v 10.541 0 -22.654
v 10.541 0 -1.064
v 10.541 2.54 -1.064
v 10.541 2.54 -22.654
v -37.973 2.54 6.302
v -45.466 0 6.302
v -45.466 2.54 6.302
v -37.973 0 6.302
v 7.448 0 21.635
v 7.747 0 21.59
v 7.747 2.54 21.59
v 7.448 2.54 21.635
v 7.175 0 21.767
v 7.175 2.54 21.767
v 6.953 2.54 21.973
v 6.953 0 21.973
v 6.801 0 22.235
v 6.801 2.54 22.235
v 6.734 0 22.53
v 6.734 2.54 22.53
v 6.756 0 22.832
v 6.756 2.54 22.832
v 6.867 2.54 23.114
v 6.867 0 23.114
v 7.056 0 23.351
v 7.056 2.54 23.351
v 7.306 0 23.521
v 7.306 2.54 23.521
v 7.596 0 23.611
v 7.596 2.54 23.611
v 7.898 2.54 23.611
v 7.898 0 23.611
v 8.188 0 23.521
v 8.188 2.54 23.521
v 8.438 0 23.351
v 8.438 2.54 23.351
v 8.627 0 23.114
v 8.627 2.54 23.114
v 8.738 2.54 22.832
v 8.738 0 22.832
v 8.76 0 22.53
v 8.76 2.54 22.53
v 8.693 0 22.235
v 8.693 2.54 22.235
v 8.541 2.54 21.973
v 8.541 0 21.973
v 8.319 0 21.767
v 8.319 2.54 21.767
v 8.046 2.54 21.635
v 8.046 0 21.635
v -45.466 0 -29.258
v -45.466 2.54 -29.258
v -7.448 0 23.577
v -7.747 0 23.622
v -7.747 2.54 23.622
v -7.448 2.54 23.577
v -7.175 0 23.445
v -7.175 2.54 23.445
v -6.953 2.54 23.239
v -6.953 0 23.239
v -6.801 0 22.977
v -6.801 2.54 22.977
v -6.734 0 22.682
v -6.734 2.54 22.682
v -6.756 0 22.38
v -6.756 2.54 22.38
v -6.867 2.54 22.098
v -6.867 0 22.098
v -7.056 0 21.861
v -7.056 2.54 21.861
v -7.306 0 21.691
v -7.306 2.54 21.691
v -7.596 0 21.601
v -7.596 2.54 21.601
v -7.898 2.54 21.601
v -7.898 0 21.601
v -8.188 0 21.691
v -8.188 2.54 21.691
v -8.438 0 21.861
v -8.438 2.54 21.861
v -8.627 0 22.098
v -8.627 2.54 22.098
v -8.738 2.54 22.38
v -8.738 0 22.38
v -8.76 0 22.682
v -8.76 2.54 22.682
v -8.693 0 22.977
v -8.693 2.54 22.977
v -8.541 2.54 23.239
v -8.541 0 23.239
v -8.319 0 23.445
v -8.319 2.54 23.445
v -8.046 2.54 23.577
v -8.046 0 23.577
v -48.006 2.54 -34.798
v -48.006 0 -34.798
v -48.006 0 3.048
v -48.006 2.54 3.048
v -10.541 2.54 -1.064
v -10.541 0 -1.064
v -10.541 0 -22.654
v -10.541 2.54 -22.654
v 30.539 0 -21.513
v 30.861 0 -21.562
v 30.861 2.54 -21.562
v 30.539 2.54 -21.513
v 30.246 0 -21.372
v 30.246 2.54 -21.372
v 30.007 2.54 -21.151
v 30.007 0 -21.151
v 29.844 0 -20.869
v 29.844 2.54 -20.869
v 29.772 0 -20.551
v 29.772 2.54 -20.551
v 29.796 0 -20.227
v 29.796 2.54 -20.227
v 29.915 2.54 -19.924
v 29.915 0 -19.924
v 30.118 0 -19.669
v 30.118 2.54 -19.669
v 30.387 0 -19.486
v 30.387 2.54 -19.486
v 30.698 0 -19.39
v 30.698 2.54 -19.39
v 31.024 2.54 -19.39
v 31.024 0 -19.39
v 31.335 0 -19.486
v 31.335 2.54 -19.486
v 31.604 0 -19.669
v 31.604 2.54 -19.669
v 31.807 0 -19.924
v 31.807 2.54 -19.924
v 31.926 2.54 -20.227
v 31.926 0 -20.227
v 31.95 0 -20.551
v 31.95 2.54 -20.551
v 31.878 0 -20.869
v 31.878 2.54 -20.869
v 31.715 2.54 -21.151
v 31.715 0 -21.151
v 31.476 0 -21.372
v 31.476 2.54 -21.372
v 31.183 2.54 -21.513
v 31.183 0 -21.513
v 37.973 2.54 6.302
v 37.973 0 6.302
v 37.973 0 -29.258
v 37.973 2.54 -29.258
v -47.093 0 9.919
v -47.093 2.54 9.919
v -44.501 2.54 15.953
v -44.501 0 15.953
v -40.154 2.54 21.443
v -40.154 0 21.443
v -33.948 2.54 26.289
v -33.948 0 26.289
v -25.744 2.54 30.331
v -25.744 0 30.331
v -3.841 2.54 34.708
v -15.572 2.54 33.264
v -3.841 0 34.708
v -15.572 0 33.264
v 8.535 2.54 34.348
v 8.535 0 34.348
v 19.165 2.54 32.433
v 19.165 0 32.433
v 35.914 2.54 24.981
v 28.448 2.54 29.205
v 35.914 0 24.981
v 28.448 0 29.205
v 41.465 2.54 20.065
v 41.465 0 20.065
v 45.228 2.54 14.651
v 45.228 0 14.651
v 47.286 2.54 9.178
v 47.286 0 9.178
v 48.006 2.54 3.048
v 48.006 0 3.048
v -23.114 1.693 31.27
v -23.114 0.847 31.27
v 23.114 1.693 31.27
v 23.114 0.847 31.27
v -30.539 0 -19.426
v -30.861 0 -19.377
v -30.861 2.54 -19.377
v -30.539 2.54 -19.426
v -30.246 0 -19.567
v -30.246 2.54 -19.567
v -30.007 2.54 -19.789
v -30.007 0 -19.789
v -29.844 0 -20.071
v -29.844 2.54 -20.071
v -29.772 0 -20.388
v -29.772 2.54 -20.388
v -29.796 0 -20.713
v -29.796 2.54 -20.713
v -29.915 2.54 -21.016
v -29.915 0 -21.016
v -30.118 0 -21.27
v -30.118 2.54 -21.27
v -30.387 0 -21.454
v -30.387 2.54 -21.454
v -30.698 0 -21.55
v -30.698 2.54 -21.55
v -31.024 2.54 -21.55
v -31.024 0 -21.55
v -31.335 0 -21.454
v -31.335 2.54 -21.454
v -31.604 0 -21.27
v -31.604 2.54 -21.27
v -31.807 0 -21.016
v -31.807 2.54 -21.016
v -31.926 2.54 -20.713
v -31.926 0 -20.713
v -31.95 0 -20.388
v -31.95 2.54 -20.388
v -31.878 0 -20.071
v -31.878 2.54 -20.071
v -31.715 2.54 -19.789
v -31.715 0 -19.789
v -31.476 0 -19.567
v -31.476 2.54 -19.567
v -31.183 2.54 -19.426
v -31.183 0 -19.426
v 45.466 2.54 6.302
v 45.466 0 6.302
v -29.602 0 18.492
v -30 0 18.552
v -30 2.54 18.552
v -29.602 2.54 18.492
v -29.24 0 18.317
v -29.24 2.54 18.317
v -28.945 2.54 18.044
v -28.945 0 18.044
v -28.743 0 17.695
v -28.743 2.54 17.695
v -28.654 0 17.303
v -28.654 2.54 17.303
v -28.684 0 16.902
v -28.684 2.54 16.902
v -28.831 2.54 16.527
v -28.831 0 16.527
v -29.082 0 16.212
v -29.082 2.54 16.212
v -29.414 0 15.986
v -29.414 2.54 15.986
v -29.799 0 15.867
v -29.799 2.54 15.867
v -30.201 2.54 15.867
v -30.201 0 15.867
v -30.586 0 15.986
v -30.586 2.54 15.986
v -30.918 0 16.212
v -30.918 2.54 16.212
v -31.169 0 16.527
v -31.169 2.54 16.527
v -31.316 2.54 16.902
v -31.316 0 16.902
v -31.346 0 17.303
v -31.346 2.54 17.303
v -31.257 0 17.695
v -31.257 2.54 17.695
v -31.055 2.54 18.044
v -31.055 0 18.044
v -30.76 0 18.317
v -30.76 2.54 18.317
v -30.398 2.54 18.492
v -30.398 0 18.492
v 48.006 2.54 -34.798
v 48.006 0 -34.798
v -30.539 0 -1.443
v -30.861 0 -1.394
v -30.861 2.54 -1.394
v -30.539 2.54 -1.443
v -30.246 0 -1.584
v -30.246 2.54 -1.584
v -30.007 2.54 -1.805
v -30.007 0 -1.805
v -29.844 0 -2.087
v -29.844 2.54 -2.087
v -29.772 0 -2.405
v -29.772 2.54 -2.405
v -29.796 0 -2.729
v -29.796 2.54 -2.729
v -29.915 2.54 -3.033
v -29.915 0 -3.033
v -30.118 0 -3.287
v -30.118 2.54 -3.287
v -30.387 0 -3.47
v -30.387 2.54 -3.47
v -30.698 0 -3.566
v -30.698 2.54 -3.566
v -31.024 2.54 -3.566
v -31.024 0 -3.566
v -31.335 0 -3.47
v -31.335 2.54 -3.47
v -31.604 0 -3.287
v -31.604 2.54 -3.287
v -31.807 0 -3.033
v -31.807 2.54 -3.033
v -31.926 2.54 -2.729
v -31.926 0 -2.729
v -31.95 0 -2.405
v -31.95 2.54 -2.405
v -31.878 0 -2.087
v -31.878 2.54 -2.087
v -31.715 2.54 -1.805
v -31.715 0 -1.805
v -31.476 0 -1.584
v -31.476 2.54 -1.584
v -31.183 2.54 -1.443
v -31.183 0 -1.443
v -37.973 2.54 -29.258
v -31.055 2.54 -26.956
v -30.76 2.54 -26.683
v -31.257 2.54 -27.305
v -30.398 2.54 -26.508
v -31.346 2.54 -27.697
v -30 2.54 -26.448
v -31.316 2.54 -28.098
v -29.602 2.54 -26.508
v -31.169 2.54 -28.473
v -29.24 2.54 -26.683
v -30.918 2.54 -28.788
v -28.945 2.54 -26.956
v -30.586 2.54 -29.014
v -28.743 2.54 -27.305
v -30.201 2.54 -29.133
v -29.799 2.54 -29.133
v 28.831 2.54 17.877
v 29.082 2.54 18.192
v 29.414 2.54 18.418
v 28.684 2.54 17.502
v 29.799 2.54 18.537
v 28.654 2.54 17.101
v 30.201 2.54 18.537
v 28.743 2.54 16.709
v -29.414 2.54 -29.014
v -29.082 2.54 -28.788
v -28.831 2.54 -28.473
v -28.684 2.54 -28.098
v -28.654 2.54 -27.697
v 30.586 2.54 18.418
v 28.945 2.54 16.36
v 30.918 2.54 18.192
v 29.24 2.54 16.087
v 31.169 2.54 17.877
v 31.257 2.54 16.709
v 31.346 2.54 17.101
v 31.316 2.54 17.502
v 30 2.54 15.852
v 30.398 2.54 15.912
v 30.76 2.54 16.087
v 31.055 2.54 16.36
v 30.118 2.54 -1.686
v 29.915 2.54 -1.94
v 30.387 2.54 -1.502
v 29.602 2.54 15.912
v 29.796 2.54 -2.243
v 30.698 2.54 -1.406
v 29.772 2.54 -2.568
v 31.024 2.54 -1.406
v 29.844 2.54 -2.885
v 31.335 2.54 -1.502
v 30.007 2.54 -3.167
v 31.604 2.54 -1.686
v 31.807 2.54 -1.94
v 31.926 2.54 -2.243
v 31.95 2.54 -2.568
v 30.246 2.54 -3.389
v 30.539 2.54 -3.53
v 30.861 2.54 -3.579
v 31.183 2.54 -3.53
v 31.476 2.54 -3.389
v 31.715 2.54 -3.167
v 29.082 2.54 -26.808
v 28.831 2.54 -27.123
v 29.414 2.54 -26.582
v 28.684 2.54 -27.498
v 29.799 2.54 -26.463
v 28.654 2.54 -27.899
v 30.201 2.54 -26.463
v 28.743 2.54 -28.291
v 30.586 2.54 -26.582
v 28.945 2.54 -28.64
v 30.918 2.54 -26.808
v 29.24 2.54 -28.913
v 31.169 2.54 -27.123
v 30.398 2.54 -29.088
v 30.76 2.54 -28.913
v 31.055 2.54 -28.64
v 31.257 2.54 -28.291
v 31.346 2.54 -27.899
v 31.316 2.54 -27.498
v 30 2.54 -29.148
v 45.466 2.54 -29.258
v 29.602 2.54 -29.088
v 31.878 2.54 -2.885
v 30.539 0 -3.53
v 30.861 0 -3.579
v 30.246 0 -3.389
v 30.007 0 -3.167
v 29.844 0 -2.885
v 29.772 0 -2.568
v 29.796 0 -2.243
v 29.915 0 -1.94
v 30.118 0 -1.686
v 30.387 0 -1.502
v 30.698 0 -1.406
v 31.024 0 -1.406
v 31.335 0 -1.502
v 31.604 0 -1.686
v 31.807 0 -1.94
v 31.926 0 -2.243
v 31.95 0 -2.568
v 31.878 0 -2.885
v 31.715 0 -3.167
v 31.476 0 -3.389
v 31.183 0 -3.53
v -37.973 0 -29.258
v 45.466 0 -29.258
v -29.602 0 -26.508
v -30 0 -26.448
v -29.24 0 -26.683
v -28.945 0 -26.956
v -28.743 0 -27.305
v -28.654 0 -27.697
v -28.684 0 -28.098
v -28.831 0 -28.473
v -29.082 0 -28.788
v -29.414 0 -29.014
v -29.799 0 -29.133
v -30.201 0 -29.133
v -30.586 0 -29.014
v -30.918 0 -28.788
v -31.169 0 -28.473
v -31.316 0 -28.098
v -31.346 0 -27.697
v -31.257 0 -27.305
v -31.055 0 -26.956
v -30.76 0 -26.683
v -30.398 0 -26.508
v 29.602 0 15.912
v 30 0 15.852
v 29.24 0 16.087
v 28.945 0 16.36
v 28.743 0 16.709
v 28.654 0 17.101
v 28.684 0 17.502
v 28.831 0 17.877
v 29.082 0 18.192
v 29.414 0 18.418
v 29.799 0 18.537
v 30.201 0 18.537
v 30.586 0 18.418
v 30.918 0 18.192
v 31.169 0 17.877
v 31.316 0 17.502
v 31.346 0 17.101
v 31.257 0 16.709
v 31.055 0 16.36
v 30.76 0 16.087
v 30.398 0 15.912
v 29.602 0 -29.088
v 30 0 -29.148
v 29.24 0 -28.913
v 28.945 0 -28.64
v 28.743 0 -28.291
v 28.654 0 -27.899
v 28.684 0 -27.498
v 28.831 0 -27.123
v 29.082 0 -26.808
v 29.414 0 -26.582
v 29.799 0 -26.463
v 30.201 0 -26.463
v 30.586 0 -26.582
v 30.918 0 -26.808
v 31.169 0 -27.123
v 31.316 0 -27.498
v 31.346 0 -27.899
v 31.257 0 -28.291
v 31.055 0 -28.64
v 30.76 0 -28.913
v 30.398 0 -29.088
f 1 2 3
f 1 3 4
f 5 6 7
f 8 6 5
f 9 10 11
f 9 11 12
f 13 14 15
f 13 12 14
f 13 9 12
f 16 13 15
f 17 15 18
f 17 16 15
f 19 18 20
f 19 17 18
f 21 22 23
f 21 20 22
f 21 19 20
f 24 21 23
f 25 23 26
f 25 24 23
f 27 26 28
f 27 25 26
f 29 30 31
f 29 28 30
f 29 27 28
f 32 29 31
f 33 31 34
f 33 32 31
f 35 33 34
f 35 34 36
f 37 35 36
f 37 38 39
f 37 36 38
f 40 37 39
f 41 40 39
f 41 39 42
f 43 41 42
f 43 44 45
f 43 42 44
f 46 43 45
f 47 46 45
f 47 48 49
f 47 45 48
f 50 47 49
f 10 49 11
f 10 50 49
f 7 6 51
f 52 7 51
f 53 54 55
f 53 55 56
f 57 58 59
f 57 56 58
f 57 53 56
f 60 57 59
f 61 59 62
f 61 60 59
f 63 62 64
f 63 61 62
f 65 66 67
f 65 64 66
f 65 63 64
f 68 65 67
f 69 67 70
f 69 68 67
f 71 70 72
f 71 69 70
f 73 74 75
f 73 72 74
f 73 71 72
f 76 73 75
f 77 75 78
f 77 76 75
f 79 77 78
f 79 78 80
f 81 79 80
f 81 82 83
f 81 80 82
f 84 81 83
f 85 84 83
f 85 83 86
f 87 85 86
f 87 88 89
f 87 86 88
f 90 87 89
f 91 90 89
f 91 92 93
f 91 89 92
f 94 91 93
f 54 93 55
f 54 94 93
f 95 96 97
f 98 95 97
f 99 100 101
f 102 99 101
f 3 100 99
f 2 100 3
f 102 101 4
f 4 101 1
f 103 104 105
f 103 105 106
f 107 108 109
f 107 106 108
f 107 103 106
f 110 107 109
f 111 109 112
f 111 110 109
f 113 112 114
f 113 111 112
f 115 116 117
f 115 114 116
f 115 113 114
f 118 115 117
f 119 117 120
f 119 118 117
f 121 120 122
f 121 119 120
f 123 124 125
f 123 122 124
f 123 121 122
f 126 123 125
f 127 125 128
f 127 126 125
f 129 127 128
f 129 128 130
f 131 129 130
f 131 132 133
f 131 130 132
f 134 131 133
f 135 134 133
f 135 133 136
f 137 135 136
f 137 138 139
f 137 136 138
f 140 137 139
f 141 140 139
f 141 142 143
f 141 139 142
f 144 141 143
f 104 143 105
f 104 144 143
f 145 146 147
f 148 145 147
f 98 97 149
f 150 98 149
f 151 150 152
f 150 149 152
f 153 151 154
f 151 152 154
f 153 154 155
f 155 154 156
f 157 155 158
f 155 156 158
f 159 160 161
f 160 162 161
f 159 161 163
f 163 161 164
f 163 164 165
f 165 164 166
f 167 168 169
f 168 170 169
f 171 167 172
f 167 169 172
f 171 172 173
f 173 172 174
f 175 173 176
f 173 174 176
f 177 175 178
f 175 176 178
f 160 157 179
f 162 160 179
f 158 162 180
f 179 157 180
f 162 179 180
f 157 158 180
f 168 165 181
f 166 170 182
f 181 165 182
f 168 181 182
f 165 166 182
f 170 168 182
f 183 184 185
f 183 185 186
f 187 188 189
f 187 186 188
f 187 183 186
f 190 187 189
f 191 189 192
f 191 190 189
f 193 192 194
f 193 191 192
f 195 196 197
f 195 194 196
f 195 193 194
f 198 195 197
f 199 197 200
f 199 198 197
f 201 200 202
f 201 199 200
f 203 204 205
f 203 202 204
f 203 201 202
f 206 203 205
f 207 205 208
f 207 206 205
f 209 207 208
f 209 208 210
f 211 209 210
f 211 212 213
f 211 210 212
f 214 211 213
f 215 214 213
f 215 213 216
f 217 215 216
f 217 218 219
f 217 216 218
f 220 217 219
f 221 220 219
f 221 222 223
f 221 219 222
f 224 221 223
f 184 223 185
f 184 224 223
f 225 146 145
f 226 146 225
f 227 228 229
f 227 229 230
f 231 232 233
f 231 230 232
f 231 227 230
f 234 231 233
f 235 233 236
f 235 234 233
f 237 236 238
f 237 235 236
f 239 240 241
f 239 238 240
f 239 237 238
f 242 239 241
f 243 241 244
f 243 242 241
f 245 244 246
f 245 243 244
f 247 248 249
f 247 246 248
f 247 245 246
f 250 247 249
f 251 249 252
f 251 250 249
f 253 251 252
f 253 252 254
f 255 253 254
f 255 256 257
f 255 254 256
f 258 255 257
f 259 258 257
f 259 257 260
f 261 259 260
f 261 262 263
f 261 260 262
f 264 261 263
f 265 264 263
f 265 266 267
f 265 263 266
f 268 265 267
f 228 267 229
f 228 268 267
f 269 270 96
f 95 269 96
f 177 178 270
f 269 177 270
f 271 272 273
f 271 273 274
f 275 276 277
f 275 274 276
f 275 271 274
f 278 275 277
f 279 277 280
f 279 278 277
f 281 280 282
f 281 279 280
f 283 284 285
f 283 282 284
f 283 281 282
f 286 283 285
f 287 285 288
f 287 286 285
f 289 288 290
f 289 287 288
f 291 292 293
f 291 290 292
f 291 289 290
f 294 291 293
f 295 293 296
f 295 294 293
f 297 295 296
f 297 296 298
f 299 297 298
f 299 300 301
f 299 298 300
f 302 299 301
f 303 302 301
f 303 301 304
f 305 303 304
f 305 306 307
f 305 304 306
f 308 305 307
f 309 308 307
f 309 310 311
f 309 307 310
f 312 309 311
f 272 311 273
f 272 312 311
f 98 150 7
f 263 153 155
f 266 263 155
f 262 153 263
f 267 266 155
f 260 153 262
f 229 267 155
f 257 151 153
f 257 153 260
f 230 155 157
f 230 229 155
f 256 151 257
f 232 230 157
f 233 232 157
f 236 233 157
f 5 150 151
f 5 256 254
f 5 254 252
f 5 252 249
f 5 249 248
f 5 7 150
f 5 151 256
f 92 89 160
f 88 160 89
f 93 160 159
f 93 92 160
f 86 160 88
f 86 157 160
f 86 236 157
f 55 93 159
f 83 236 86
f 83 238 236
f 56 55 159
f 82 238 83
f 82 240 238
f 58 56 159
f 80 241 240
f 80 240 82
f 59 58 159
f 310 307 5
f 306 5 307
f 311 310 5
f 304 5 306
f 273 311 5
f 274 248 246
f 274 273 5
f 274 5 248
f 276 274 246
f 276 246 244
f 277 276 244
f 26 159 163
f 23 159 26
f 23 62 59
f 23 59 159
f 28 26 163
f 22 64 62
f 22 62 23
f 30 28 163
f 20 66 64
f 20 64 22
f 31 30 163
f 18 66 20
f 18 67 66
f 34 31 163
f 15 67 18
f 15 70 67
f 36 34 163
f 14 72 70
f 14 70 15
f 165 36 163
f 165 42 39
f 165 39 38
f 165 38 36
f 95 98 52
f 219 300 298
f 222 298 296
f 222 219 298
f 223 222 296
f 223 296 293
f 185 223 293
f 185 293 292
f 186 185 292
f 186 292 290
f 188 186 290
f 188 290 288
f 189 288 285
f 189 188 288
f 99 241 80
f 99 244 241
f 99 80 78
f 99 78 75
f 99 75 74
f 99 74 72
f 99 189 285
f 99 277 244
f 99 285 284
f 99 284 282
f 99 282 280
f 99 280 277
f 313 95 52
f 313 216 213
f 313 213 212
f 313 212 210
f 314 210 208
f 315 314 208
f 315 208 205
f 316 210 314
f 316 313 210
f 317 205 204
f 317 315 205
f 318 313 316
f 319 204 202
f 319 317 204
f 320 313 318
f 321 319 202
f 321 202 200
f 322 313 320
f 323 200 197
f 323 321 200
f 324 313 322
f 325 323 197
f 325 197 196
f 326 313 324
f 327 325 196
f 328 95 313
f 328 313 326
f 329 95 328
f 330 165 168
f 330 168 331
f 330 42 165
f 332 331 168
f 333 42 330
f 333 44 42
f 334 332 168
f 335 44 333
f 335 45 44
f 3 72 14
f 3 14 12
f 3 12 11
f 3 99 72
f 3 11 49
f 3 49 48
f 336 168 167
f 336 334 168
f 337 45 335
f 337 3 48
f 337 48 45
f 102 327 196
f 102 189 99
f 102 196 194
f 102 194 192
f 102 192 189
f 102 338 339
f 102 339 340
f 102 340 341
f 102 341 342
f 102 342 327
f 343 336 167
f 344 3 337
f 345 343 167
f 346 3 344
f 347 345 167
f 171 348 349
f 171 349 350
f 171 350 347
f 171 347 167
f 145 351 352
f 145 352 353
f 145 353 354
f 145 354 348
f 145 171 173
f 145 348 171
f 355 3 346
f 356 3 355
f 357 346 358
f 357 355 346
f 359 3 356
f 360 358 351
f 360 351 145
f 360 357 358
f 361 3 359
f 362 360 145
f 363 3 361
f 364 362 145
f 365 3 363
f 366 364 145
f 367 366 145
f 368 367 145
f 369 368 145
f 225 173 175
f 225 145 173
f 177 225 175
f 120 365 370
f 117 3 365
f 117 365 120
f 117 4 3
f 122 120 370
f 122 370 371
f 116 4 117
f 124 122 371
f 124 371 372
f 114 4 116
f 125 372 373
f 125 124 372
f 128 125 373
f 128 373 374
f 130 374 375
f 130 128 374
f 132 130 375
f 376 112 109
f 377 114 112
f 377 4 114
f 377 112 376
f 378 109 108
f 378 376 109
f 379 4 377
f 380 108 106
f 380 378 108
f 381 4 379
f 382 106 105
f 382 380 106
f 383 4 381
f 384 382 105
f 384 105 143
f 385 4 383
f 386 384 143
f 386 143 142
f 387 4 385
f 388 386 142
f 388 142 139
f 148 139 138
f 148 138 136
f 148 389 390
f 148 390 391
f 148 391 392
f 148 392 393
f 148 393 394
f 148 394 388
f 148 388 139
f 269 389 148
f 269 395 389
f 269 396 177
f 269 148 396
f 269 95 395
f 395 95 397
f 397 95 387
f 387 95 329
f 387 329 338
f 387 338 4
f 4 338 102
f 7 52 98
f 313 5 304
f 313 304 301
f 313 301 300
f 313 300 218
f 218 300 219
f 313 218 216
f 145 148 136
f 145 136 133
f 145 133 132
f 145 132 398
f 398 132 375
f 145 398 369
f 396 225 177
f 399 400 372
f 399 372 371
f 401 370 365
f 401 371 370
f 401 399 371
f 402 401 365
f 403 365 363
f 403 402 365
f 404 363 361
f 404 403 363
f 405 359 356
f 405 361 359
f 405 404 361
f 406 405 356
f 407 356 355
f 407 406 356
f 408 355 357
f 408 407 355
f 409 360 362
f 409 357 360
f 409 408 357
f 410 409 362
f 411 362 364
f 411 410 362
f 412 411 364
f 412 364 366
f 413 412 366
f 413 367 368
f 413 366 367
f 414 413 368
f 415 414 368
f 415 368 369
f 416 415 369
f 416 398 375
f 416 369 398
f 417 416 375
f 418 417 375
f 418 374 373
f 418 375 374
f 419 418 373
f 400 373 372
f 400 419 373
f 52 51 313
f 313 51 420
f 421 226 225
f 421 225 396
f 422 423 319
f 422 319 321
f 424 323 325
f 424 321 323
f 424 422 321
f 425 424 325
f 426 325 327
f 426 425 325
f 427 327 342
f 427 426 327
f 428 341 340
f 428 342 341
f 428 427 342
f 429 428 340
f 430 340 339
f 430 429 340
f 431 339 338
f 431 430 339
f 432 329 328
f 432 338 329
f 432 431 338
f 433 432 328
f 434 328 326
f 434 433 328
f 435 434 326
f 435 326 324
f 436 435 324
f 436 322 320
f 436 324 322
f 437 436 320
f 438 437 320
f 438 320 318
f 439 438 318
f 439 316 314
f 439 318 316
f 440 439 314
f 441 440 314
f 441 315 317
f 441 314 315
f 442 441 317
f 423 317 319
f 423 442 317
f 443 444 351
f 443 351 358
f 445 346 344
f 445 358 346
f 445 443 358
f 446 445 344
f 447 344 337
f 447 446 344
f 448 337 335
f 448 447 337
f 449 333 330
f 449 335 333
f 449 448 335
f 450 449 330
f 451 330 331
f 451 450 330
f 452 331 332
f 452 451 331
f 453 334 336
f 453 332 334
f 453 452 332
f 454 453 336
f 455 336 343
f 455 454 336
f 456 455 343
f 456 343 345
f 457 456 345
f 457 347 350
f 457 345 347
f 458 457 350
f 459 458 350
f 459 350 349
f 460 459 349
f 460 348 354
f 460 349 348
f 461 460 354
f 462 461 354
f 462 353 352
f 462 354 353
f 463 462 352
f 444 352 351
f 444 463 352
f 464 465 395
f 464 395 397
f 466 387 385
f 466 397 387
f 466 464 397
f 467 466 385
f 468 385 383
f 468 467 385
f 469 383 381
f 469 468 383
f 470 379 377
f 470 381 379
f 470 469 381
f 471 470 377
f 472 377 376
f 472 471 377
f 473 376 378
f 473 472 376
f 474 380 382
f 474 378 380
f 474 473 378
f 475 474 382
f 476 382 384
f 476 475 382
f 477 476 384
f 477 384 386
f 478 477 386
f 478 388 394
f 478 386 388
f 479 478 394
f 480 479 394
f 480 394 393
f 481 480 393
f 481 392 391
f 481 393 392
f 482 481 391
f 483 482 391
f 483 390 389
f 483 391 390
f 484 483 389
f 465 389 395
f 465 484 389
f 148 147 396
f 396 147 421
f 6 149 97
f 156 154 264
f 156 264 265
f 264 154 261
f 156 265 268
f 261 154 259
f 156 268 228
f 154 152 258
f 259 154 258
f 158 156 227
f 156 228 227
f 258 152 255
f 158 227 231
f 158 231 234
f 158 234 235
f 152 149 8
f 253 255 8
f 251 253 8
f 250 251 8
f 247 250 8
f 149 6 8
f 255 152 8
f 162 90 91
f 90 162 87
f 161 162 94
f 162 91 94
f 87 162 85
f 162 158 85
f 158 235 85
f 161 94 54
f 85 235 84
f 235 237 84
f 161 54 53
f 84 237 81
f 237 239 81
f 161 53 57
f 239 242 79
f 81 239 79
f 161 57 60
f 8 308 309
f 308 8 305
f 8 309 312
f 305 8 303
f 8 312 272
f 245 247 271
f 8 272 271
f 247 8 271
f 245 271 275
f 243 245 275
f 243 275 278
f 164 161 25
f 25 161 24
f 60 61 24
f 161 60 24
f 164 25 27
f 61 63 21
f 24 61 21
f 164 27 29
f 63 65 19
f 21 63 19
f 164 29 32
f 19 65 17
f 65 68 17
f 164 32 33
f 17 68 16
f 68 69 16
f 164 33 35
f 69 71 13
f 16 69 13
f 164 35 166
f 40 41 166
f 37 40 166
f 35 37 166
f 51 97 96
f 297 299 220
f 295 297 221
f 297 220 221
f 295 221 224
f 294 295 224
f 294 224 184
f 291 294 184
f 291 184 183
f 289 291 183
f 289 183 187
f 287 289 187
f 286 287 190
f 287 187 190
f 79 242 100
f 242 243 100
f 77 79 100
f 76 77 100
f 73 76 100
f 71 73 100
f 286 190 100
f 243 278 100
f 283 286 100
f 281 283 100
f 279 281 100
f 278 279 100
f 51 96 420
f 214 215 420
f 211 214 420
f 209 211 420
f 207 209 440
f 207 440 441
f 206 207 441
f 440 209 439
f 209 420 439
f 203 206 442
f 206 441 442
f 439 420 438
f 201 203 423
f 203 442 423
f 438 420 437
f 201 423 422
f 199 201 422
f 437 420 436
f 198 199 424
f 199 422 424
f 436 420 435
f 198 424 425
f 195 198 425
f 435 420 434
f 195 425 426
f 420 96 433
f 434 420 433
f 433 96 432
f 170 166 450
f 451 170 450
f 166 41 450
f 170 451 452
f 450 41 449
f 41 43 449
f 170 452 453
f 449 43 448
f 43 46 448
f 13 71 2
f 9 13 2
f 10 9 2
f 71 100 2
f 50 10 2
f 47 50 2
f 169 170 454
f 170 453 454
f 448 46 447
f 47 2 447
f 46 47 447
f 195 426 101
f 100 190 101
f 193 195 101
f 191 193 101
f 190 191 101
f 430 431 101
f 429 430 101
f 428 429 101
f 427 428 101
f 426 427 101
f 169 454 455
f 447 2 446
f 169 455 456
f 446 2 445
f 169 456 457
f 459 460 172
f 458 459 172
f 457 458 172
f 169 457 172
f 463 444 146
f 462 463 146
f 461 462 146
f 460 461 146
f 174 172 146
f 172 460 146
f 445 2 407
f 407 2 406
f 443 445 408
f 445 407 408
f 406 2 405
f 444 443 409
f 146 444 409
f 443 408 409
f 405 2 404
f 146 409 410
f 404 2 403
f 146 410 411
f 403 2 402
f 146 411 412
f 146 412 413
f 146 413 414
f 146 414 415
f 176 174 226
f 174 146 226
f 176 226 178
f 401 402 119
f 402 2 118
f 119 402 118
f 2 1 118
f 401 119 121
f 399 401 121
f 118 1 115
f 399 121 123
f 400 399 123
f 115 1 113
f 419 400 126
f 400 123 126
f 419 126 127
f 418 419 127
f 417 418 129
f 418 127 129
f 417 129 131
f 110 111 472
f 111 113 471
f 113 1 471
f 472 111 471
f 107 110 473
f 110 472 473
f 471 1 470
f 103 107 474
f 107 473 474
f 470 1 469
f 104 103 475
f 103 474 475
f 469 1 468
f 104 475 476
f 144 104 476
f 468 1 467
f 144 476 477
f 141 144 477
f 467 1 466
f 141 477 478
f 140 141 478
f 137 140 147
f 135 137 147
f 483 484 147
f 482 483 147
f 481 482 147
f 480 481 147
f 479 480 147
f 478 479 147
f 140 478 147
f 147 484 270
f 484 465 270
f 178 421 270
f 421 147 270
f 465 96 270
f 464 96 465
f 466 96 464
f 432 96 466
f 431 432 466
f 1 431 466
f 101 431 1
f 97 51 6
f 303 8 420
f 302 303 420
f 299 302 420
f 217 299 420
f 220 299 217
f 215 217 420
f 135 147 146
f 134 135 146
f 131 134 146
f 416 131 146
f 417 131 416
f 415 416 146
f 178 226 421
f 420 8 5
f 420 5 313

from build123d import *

# Parameters (mm, degrees)
BOSS_EXTRUDE1_DEPTH     = 2.54
CUT_EXTRUDE1_DEPTH      = 60.34583774
CUT_EXTRUDE1_DEPTH_BACK = 60.34583774
SKETCH3_R               = 1.0922
SKETCH3_R_2             = 1.35
SKETCH3_R_3             = 1.016
SKETCH3_W               = 7.493
SKETCH3_H               = 35.56
SKETCH3_W_2             = 21.082
SKETCH3_H_2             = 21.59


with BuildPart() as part:
    # Sketch2 → Boss-Extrude1 (new body)
    with BuildSketch(Plane(origin=(0, 0, 0), x_dir=(1, 0, 0), z_dir=(0, 1, 0))):
        with BuildLine():
            Line((48.006, 34.798), (-48.006, 34.798))
            Line((-48.006, 34.798), (-48.006, -3.048))
            add(Edge.make_bspline(
                [(-48.006, -3.048), (-48.006, -45.381333333), (48.006, -45.381333333), (48.006, -3.048)],
                knots=[0, 0, 0, 0, 1, 1, 1, 1], degree=3))
            Line((48.006, -3.048), (48.006, 34.798))
        make_face()
    extrude(amount=BOSS_EXTRUDE1_DEPTH)

    # Sketch3 → Cut-Extrude1 (cut, two sides: drawn at the far end of the back side and taken through both)
    with BuildSketch(Plane(origin=(0, 2.54, 0), x_dir=(1, 0, 0), z_dir=(0, 1, 0)).offset(-CUT_EXTRUDE1_DEPTH_BACK)):
        with Locations(Location((-30.861, 20.4696, 0), (0, 0, 270))):
            Circle(SKETCH3_R)
        with Locations(Location((-30.861, 2.4864, 0), (0, 0, 270))):
            Circle(SKETCH3_R)
        with Locations(Location((-30, 27.798, 0), (0, 0, 270))):
            Circle(SKETCH3_R_2)
        with Locations(Location((30.861, 2.4864, 0), (0, 0, 90))):
            Circle(SKETCH3_R)
        with Locations(Location((30.861, 20.4696, 0), (0, 0, 90))):
            Circle(SKETCH3_R)
        with Locations(Location((-30, -17.202, 0), (0, 0, 270))):
            Circle(SKETCH3_R_2)
        with Locations(Location((30, -17.202, 0), (0, 0, 90))):
            Circle(SKETCH3_R_2)
        with Locations(Location((30, 27.798, 0), (0, 0, 90))):
            Circle(SKETCH3_R_2)
        with Locations(Location((-7.747, -22.606, 0), (0, 0, 270))):
            Circle(SKETCH3_R_3)
        with Locations(Location((7.747, -22.606, 0), (0, 0, 90))):
            Circle(SKETCH3_R_3)
        with Locations((-41.7195, 11.478)):
            Rectangle(SKETCH3_W, SKETCH3_H)
        with Locations((41.7195, 11.478)):
            Rectangle(SKETCH3_W, SKETCH3_H)
        with Locations((0, 11.859)):
            Rectangle(SKETCH3_W_2, SKETCH3_H_2)
    extrude(amount=CUT_EXTRUDE1_DEPTH + CUT_EXTRUDE1_DEPTH_BACK, mode=Mode.SUBTRACT)


solid = part.part
